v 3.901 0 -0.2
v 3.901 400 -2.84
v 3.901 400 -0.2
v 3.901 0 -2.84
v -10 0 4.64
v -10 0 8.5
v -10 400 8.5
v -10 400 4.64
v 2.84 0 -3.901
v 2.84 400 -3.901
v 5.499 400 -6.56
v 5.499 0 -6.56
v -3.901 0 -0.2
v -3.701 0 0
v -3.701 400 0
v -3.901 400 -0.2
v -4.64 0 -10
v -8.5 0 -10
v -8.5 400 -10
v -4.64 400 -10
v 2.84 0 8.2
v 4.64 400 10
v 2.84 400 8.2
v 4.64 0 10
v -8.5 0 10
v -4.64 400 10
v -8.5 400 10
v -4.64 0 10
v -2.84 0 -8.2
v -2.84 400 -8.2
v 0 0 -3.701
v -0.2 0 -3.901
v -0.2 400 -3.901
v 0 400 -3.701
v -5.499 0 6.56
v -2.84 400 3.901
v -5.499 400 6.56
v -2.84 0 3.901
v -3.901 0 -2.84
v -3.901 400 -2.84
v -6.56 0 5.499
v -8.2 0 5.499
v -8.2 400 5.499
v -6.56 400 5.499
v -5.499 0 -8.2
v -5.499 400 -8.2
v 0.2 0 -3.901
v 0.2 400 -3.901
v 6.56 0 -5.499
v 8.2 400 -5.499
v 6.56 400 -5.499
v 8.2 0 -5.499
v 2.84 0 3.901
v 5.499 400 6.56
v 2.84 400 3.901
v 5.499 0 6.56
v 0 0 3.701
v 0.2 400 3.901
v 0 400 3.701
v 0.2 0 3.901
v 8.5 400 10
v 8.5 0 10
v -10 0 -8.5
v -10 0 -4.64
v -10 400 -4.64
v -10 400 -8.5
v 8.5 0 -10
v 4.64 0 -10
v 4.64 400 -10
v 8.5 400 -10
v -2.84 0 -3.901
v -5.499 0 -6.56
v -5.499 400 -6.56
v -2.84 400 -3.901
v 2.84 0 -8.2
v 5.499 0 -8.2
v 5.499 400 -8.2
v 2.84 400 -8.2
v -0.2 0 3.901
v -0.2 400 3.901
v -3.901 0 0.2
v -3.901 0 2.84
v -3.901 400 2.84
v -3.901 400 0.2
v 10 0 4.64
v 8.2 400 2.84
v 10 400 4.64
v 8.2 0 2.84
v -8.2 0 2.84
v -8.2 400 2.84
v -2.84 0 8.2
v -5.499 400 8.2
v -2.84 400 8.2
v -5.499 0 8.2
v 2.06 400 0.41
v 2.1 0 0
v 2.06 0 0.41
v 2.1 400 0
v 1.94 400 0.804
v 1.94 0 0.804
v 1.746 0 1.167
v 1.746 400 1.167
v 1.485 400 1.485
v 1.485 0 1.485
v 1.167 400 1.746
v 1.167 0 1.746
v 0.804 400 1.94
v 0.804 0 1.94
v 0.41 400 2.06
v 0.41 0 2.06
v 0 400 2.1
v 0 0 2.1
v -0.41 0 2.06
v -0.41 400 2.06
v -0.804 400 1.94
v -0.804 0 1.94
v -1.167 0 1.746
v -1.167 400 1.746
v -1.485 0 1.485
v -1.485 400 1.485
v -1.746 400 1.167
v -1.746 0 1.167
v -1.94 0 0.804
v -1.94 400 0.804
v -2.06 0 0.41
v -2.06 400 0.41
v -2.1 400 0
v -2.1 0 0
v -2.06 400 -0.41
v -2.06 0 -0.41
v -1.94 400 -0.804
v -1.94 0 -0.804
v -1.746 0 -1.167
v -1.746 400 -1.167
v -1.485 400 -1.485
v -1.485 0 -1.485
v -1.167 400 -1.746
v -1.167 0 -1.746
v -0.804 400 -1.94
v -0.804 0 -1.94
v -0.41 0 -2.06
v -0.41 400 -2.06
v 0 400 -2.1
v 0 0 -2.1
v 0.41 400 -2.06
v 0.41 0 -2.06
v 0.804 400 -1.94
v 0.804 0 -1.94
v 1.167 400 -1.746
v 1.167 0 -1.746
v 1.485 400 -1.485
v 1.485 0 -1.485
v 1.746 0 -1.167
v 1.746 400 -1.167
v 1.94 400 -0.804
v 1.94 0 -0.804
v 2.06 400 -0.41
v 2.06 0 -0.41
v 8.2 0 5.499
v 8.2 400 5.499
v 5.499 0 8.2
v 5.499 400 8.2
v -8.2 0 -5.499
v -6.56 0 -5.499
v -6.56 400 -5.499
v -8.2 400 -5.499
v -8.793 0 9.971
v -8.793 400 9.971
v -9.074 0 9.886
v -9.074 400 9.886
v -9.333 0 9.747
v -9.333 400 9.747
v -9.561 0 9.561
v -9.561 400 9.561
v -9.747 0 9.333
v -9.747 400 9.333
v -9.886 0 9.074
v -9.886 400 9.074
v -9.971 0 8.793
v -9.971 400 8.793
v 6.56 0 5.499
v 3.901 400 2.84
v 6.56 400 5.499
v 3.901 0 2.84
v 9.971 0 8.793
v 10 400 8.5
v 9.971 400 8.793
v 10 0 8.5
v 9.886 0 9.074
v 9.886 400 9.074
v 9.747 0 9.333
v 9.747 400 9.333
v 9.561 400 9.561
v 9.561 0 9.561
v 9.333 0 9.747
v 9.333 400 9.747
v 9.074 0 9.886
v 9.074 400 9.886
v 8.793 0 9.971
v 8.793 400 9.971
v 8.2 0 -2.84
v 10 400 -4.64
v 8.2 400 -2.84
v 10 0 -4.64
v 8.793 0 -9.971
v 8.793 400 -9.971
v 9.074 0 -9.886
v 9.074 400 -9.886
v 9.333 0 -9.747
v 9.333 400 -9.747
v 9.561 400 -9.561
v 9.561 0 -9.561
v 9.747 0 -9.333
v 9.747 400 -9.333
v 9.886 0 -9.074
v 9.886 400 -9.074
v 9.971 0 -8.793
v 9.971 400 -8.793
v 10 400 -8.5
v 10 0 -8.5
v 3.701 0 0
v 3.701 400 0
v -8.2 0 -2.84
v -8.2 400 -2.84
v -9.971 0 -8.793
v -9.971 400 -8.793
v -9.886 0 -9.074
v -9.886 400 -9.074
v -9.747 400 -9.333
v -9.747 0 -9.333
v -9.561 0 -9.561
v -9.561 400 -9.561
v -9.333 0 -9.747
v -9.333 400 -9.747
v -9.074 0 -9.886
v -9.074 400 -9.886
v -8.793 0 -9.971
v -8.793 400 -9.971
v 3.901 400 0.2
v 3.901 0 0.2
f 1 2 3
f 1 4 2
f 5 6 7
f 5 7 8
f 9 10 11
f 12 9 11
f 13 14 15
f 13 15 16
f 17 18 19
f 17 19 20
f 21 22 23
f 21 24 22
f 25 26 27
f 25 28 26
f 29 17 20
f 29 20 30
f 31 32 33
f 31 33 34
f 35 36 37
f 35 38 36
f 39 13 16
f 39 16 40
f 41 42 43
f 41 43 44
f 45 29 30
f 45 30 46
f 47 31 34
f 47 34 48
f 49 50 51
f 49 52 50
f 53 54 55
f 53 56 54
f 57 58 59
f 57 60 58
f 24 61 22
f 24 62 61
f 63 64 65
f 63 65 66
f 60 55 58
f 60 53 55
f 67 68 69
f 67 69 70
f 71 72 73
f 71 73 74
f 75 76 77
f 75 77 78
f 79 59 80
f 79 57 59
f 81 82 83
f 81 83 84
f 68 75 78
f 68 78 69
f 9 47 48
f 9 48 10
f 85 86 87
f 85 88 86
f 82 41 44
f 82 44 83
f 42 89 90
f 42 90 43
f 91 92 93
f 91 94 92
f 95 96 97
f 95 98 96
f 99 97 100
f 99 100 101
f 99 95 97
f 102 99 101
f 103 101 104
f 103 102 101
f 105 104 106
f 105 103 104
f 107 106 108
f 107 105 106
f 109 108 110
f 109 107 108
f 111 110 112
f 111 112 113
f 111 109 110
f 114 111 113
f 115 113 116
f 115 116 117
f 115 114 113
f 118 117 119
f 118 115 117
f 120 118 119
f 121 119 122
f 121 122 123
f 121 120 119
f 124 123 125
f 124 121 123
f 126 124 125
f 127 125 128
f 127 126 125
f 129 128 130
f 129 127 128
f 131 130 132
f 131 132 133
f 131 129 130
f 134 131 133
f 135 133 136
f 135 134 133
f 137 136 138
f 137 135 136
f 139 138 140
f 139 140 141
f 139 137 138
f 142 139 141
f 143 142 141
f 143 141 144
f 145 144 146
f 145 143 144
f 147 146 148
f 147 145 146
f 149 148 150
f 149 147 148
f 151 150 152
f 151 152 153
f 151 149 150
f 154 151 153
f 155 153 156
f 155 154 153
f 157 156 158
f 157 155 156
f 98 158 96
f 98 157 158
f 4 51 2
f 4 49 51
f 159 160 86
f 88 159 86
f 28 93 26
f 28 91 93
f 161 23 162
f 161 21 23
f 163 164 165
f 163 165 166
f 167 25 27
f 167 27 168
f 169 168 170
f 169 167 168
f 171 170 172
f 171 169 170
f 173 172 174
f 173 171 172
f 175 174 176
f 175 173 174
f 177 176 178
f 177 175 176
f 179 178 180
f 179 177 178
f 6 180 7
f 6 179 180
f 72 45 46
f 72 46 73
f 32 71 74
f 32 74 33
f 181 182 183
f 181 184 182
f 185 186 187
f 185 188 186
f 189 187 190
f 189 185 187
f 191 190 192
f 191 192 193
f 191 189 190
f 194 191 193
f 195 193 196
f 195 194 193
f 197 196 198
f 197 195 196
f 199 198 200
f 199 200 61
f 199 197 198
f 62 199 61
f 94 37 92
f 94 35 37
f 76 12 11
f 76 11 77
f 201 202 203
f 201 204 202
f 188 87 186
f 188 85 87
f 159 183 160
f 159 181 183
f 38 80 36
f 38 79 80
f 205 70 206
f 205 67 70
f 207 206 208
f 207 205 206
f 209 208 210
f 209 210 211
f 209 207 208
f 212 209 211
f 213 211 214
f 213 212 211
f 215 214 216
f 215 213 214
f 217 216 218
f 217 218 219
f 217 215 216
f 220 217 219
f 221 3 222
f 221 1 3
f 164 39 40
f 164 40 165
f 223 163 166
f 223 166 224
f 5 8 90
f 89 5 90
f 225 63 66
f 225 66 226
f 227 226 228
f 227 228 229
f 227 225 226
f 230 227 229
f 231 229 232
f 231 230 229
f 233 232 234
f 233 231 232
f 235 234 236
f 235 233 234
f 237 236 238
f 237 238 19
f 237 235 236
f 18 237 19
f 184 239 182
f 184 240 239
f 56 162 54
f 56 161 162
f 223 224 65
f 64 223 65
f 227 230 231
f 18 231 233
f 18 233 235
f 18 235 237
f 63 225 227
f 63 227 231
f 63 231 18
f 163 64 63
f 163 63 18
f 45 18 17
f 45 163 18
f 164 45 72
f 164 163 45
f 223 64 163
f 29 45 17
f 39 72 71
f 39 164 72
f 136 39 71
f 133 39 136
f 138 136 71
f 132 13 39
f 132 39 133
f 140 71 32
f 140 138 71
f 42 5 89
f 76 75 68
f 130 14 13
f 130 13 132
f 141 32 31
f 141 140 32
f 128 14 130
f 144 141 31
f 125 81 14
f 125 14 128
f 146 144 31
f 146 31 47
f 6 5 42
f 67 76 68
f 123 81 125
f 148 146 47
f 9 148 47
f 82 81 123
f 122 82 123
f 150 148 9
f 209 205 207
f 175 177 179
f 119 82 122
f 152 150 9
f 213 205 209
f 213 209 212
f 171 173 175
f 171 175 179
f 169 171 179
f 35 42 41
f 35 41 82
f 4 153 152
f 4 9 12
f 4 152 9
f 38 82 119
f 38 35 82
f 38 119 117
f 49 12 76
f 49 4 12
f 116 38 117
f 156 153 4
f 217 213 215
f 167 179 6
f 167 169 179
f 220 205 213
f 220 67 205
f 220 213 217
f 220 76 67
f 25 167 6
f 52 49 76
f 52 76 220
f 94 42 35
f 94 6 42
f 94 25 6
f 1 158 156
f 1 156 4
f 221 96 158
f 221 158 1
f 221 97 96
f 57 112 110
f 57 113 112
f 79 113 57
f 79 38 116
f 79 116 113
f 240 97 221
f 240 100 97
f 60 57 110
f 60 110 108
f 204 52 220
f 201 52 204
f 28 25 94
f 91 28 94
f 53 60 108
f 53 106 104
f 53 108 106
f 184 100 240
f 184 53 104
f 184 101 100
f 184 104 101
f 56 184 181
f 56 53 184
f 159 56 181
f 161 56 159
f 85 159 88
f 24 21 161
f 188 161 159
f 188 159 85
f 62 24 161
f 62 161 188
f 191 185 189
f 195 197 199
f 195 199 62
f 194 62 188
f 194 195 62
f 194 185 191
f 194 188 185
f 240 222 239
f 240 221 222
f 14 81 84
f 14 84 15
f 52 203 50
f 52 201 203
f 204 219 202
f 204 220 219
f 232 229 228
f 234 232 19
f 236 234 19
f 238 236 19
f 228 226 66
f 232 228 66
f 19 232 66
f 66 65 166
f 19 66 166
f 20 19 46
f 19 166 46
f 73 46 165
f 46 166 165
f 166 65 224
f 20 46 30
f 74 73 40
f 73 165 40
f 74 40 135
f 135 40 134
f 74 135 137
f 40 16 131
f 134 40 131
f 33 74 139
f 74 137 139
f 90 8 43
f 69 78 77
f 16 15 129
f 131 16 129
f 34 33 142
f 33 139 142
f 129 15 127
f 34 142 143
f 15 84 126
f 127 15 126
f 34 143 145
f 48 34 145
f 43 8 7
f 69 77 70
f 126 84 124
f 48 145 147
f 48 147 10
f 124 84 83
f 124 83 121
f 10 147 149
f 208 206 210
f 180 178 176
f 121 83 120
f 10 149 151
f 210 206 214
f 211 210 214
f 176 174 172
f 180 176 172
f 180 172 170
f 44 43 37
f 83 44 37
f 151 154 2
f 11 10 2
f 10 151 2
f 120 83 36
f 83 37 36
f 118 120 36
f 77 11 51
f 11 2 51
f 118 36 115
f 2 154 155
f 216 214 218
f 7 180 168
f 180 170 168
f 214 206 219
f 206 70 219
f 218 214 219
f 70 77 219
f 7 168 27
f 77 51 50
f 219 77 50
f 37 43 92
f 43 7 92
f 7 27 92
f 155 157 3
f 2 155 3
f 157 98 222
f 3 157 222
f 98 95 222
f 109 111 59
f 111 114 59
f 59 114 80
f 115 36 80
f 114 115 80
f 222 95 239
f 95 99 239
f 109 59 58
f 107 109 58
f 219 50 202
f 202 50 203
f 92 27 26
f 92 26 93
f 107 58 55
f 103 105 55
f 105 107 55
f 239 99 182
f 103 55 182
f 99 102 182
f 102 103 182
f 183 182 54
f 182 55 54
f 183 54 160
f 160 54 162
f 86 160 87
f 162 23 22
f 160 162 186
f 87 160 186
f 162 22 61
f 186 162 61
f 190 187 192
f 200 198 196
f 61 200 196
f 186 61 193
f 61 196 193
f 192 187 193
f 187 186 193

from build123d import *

# Parameters (mm, degrees)
F0_R     = 2.1
F1_DEPTH = 200


# Not quite as in the source:
# - ends of sketch curves that miss each other by under 0.0002 mm in the source are joined


with BuildPart() as f1:
    # F0 (on Front) → F1 (new body, symmetric)
    with BuildSketch(Plane.XZ):
        with BuildLine():
            Line((-4.64, 10.000002), (-8.500001, 10.000002))
            ThreePointArc((-8.500001, 10.000002), (-9.5606615253, 9.5606618182), (-10.000001, 8.500001))
            Line((-10.000001, 8.500001), (-10.000001, 4.640001))
            Line((-10.000001, 4.640001), (-8.199999, 2.840001))
            Line((-8.199999, 2.840001), (-8.199999, 5.499339))
            Line((-8.199999, 5.499339), (-6.56, 5.499339))
            Line((-6.56, 5.499339), (-3.90066, 2.840001))
            Line((-3.90066, 2.840001), (-3.90066, 0.2))
            Line((-3.90066, 0.2), (-3.70066, 0))
            Line((-3.70066, 0), (-3.90066, -0.2))
            Line((-3.90066, -0.2), (-3.90066, -2.840001))
            Line((-3.90066, -2.840001), (-6.56, -5.499341))
            Line((-6.56, -5.499341), (-8.199999, -5.499341))
            Line((-8.199999, -5.499341), (-8.199999, -2.840001))
            Line((-8.199999, -2.840001), (-10.000001, -4.640001))
            Line((-10.000001, -4.640001), (-10.000001, -8.500001))
            ThreePointArc((-10.000001, -8.500001), (-9.5606608182, -9.5606615253), (-8.500001, -10.000001))
            Line((-8.500001, -10.000001), (-4.64, -10.000001))
            Line((-4.64, -10.000001), (-2.84, -8.2))
            Line((-2.84, -8.2), (-5.49934, -8.2))
            Line((-5.49934, -8.2), (-5.49934, -6.560001))
            Line((-5.49934, -6.560001), (-2.84, -3.900661))
            Line((-2.84, -3.900661), (-0.199999, -3.900661))
            Line((-0.199999, -3.900661), (1e-06, -3.700661))
            Line((1e-06, -3.700661), (0.200001, -3.900661))
            Line((0.200001, -3.900661), (2.84, -3.900661))
            Line((2.84, -3.900661), (5.499342, -6.560001))
            Line((5.499342, -6.560001), (5.499342, -8.2))
            Line((5.499342, -8.2), (2.84, -8.2))
            Line((2.84, -8.2), (4.64, -10.000001))
            Line((4.64, -10.000001), (8.500001, -10.000001))
            ThreePointArc((8.500001, -10.000001), (9.5606611718, -9.5606611718), (10.000001, -8.500001))
            Line((10.000001, -8.500001), (10.000001, -4.640001))
            Line((10.000001, -4.640001), (8.200001, -2.840001))
            Line((8.200001, -2.840001), (8.200001, -5.499341))
            Line((8.200001, -5.499341), (6.560002, -5.499341))
            Line((6.560002, -5.499341), (3.90066, -2.840001))
            Line((3.90066, -2.840001), (3.90066, -0.2))
            Line((3.90066, -0.2), (3.70066, 0))
            Line((3.70066, 0), (3.90066, 0.2))
            Line((3.90066, 0.2), (3.90066, 2.840001))
            Line((3.90066, 2.840001), (6.560002, 5.499339))
            Line((6.560002, 5.499339), (8.200001, 5.499339))
            Line((8.200001, 5.499339), (8.200001, 2.840001))
            Line((8.200001, 2.840001), (10.000001, 4.640001))
            Line((10.000001, 4.640001), (10.000001, 8.500002))
            ThreePointArc((10.000001, 8.500002), (9.5606611718, 9.5606621718), (8.500001, 10.000002))
            Line((8.500001, 10.000002), (4.64, 10.000002))
            Line((4.64, 10.000002), (2.84, 8.200002))
            Line((2.84, 8.200002), (5.499342, 8.200002))
            Line((5.499342, 8.200002), (5.499342, 6.559999))
            Line((5.499342, 6.559999), (2.84, 3.900661))
            Line((2.84, 3.900661), (0.200001, 3.900661))
            Line((0.200001, 3.900661), (1e-06, 3.700661))
            Line((1e-06, 3.700661), (-0.199999, 3.900661))
            Line((-0.199999, 3.900661), (-2.84, 3.900661))
            Line((-2.84, 3.900661), (-5.49934, 6.559999))
            Line((-5.49934, 6.559999), (-5.49934, 8.200002))
            Line((-5.49934, 8.200002), (-2.84, 8.200002))
            Line((-2.84, 8.200002), (-4.64, 10.000002))
        make_face()
        with Locations((1e-06, 0)):
            Circle(F0_R, mode=Mode.SUBTRACT)
    extrude(amount=F1_DEPTH, both=True)


with BuildPart() as f1_1:
    # F2: moved
    add(f1.part.moved(Location((0, 200, 0))))


solid = f1_1.part
